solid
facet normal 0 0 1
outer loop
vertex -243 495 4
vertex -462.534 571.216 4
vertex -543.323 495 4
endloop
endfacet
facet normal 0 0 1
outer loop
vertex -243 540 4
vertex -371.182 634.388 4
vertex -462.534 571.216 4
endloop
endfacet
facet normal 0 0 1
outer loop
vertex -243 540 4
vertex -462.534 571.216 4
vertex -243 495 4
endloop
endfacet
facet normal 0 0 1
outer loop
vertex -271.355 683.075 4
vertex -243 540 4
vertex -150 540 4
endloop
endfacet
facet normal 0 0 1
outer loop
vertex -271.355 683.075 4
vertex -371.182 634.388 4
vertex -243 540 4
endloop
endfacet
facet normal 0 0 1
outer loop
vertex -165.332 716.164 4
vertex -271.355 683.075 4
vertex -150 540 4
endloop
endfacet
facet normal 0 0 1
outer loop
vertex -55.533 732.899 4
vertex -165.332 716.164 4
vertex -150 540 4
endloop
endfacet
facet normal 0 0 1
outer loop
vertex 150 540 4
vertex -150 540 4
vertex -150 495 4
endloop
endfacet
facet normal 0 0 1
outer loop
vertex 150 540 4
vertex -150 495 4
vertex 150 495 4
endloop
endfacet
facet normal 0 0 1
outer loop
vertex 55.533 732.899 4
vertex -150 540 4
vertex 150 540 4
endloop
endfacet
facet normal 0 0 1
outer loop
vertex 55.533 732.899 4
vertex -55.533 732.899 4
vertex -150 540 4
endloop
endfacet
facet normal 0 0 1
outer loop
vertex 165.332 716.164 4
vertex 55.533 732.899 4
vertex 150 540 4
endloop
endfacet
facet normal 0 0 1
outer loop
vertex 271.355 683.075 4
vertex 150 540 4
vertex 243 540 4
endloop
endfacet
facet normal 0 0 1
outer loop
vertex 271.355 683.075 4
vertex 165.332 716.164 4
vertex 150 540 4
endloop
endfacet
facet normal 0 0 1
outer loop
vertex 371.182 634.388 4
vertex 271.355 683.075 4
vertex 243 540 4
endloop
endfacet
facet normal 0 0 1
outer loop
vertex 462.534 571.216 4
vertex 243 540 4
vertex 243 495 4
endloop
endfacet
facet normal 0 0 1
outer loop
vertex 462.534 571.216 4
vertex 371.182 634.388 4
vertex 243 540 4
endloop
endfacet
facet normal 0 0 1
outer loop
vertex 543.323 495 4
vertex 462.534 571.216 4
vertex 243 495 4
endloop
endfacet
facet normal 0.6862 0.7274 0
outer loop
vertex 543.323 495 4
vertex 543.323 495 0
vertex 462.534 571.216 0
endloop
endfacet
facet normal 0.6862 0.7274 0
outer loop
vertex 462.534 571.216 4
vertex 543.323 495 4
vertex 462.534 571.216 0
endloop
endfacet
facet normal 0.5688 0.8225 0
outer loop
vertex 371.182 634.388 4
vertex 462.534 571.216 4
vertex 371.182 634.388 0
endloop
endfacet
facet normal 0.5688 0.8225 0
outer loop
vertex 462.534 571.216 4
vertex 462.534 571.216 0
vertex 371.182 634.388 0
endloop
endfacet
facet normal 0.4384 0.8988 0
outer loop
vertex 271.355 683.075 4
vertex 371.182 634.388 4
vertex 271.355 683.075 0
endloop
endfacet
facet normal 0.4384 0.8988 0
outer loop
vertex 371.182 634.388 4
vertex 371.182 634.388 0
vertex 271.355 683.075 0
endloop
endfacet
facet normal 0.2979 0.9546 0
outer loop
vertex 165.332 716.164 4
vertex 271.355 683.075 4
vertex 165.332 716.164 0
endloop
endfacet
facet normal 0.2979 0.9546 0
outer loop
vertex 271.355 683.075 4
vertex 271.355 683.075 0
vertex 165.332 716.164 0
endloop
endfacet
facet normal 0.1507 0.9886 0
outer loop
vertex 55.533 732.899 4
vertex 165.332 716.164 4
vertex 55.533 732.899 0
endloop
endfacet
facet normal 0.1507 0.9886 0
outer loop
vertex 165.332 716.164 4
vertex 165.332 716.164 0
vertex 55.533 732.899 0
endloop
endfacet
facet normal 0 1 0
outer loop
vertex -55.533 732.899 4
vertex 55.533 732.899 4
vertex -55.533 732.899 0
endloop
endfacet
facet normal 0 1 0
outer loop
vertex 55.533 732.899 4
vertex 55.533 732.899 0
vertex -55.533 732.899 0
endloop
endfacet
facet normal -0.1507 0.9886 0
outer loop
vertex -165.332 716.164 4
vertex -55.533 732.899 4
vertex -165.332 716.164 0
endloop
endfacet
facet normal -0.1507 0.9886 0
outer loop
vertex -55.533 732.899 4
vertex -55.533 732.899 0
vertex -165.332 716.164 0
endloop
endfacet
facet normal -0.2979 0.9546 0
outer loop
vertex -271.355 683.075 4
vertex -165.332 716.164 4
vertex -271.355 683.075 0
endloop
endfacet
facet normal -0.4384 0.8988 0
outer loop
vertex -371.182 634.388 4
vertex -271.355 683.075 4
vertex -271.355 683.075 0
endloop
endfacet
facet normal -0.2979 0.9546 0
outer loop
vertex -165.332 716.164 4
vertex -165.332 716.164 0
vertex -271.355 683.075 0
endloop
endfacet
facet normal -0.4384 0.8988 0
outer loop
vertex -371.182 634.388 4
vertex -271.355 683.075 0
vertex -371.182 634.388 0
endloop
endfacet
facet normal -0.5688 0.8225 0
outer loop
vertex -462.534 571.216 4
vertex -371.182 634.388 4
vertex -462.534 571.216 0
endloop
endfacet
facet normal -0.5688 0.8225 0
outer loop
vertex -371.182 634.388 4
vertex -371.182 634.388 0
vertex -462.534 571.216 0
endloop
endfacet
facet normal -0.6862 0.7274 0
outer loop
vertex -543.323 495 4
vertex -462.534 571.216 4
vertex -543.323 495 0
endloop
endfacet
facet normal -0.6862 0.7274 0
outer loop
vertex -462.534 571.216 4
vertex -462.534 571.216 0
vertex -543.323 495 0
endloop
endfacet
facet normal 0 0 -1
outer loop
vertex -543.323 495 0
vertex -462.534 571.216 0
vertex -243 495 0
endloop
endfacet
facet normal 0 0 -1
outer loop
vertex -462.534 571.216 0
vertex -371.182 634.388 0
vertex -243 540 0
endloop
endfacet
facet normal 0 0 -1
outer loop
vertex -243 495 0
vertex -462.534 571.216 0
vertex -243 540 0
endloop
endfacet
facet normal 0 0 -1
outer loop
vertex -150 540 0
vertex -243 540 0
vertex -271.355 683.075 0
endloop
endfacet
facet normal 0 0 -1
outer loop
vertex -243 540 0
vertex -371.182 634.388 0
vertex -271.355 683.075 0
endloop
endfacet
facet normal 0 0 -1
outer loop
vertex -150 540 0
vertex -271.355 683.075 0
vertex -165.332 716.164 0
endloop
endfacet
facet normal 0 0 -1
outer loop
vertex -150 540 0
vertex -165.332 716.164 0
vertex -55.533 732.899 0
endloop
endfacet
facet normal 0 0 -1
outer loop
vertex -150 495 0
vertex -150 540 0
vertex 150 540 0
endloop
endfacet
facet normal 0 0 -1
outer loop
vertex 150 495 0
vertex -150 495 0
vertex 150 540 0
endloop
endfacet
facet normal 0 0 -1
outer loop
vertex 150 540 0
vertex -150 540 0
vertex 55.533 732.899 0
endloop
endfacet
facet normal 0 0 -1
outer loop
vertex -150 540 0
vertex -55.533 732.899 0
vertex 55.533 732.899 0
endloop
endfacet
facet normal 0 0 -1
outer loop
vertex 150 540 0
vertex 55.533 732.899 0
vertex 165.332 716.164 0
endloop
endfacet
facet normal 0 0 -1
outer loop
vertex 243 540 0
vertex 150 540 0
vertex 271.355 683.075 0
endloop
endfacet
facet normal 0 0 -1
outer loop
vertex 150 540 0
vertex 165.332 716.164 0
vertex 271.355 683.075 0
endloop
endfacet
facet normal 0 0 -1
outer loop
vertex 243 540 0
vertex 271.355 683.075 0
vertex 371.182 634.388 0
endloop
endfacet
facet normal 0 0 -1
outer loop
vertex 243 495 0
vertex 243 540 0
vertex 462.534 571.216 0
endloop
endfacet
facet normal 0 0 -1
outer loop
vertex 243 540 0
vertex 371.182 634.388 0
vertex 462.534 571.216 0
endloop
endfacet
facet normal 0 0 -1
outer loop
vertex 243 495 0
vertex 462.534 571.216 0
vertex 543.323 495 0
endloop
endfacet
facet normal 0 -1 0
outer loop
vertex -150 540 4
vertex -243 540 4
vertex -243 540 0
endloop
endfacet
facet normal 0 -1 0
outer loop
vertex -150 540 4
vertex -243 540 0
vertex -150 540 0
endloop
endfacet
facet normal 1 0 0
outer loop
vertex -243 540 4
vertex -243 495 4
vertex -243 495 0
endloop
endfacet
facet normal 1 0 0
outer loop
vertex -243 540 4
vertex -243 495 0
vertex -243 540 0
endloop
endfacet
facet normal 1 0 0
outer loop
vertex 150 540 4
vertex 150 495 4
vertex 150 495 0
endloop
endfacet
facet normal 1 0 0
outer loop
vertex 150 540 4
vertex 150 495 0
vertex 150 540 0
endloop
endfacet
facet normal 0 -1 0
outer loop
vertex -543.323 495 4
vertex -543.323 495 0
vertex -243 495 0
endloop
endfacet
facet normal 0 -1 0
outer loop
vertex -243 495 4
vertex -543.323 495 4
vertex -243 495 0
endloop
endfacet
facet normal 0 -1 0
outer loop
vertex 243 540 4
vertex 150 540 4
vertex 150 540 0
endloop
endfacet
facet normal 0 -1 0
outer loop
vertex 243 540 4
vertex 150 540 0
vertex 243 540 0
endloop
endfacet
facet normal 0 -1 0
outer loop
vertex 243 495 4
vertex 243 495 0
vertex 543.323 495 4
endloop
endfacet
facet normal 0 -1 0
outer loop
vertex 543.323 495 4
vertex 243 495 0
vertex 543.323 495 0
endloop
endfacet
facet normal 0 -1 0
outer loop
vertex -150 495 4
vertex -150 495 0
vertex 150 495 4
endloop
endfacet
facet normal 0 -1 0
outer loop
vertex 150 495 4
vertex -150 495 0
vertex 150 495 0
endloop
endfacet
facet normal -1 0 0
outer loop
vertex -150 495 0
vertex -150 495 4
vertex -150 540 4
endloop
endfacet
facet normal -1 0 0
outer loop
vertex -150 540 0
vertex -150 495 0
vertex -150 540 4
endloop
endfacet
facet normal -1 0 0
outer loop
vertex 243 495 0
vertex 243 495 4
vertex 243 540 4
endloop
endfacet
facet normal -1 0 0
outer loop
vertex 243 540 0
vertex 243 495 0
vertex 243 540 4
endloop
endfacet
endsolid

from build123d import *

# Parameters (mm, degrees)
F1_DEPTH = 4
F2_W     = 93
F2_H     = 45
F3_DEPTH = 25


with BuildPart() as f1:
    # F0 (on Top) → F1 (new body)
    with BuildSketch(Plane.XY):
        with BuildLine():
            Line((-543.323108, 495), (543.323108, 495))
            ThreePointArc((543.323108, 495), (0, 735), (-543.323108, 495))
        make_face()
    extrude(amount=F1_DEPTH)

    # F2 (on face) → F3 (cut)
    with BuildSketch(Plane.XY.offset(4)):
        with Locations((196.5, 517.5)):
            Rectangle(F2_W, F2_H)
        with Locations((-196.5, 517.5)):
            Rectangle(F2_W, F2_H)
    extrude(amount=-F3_DEPTH, mode=Mode.SUBTRACT)


solid = f1.part
